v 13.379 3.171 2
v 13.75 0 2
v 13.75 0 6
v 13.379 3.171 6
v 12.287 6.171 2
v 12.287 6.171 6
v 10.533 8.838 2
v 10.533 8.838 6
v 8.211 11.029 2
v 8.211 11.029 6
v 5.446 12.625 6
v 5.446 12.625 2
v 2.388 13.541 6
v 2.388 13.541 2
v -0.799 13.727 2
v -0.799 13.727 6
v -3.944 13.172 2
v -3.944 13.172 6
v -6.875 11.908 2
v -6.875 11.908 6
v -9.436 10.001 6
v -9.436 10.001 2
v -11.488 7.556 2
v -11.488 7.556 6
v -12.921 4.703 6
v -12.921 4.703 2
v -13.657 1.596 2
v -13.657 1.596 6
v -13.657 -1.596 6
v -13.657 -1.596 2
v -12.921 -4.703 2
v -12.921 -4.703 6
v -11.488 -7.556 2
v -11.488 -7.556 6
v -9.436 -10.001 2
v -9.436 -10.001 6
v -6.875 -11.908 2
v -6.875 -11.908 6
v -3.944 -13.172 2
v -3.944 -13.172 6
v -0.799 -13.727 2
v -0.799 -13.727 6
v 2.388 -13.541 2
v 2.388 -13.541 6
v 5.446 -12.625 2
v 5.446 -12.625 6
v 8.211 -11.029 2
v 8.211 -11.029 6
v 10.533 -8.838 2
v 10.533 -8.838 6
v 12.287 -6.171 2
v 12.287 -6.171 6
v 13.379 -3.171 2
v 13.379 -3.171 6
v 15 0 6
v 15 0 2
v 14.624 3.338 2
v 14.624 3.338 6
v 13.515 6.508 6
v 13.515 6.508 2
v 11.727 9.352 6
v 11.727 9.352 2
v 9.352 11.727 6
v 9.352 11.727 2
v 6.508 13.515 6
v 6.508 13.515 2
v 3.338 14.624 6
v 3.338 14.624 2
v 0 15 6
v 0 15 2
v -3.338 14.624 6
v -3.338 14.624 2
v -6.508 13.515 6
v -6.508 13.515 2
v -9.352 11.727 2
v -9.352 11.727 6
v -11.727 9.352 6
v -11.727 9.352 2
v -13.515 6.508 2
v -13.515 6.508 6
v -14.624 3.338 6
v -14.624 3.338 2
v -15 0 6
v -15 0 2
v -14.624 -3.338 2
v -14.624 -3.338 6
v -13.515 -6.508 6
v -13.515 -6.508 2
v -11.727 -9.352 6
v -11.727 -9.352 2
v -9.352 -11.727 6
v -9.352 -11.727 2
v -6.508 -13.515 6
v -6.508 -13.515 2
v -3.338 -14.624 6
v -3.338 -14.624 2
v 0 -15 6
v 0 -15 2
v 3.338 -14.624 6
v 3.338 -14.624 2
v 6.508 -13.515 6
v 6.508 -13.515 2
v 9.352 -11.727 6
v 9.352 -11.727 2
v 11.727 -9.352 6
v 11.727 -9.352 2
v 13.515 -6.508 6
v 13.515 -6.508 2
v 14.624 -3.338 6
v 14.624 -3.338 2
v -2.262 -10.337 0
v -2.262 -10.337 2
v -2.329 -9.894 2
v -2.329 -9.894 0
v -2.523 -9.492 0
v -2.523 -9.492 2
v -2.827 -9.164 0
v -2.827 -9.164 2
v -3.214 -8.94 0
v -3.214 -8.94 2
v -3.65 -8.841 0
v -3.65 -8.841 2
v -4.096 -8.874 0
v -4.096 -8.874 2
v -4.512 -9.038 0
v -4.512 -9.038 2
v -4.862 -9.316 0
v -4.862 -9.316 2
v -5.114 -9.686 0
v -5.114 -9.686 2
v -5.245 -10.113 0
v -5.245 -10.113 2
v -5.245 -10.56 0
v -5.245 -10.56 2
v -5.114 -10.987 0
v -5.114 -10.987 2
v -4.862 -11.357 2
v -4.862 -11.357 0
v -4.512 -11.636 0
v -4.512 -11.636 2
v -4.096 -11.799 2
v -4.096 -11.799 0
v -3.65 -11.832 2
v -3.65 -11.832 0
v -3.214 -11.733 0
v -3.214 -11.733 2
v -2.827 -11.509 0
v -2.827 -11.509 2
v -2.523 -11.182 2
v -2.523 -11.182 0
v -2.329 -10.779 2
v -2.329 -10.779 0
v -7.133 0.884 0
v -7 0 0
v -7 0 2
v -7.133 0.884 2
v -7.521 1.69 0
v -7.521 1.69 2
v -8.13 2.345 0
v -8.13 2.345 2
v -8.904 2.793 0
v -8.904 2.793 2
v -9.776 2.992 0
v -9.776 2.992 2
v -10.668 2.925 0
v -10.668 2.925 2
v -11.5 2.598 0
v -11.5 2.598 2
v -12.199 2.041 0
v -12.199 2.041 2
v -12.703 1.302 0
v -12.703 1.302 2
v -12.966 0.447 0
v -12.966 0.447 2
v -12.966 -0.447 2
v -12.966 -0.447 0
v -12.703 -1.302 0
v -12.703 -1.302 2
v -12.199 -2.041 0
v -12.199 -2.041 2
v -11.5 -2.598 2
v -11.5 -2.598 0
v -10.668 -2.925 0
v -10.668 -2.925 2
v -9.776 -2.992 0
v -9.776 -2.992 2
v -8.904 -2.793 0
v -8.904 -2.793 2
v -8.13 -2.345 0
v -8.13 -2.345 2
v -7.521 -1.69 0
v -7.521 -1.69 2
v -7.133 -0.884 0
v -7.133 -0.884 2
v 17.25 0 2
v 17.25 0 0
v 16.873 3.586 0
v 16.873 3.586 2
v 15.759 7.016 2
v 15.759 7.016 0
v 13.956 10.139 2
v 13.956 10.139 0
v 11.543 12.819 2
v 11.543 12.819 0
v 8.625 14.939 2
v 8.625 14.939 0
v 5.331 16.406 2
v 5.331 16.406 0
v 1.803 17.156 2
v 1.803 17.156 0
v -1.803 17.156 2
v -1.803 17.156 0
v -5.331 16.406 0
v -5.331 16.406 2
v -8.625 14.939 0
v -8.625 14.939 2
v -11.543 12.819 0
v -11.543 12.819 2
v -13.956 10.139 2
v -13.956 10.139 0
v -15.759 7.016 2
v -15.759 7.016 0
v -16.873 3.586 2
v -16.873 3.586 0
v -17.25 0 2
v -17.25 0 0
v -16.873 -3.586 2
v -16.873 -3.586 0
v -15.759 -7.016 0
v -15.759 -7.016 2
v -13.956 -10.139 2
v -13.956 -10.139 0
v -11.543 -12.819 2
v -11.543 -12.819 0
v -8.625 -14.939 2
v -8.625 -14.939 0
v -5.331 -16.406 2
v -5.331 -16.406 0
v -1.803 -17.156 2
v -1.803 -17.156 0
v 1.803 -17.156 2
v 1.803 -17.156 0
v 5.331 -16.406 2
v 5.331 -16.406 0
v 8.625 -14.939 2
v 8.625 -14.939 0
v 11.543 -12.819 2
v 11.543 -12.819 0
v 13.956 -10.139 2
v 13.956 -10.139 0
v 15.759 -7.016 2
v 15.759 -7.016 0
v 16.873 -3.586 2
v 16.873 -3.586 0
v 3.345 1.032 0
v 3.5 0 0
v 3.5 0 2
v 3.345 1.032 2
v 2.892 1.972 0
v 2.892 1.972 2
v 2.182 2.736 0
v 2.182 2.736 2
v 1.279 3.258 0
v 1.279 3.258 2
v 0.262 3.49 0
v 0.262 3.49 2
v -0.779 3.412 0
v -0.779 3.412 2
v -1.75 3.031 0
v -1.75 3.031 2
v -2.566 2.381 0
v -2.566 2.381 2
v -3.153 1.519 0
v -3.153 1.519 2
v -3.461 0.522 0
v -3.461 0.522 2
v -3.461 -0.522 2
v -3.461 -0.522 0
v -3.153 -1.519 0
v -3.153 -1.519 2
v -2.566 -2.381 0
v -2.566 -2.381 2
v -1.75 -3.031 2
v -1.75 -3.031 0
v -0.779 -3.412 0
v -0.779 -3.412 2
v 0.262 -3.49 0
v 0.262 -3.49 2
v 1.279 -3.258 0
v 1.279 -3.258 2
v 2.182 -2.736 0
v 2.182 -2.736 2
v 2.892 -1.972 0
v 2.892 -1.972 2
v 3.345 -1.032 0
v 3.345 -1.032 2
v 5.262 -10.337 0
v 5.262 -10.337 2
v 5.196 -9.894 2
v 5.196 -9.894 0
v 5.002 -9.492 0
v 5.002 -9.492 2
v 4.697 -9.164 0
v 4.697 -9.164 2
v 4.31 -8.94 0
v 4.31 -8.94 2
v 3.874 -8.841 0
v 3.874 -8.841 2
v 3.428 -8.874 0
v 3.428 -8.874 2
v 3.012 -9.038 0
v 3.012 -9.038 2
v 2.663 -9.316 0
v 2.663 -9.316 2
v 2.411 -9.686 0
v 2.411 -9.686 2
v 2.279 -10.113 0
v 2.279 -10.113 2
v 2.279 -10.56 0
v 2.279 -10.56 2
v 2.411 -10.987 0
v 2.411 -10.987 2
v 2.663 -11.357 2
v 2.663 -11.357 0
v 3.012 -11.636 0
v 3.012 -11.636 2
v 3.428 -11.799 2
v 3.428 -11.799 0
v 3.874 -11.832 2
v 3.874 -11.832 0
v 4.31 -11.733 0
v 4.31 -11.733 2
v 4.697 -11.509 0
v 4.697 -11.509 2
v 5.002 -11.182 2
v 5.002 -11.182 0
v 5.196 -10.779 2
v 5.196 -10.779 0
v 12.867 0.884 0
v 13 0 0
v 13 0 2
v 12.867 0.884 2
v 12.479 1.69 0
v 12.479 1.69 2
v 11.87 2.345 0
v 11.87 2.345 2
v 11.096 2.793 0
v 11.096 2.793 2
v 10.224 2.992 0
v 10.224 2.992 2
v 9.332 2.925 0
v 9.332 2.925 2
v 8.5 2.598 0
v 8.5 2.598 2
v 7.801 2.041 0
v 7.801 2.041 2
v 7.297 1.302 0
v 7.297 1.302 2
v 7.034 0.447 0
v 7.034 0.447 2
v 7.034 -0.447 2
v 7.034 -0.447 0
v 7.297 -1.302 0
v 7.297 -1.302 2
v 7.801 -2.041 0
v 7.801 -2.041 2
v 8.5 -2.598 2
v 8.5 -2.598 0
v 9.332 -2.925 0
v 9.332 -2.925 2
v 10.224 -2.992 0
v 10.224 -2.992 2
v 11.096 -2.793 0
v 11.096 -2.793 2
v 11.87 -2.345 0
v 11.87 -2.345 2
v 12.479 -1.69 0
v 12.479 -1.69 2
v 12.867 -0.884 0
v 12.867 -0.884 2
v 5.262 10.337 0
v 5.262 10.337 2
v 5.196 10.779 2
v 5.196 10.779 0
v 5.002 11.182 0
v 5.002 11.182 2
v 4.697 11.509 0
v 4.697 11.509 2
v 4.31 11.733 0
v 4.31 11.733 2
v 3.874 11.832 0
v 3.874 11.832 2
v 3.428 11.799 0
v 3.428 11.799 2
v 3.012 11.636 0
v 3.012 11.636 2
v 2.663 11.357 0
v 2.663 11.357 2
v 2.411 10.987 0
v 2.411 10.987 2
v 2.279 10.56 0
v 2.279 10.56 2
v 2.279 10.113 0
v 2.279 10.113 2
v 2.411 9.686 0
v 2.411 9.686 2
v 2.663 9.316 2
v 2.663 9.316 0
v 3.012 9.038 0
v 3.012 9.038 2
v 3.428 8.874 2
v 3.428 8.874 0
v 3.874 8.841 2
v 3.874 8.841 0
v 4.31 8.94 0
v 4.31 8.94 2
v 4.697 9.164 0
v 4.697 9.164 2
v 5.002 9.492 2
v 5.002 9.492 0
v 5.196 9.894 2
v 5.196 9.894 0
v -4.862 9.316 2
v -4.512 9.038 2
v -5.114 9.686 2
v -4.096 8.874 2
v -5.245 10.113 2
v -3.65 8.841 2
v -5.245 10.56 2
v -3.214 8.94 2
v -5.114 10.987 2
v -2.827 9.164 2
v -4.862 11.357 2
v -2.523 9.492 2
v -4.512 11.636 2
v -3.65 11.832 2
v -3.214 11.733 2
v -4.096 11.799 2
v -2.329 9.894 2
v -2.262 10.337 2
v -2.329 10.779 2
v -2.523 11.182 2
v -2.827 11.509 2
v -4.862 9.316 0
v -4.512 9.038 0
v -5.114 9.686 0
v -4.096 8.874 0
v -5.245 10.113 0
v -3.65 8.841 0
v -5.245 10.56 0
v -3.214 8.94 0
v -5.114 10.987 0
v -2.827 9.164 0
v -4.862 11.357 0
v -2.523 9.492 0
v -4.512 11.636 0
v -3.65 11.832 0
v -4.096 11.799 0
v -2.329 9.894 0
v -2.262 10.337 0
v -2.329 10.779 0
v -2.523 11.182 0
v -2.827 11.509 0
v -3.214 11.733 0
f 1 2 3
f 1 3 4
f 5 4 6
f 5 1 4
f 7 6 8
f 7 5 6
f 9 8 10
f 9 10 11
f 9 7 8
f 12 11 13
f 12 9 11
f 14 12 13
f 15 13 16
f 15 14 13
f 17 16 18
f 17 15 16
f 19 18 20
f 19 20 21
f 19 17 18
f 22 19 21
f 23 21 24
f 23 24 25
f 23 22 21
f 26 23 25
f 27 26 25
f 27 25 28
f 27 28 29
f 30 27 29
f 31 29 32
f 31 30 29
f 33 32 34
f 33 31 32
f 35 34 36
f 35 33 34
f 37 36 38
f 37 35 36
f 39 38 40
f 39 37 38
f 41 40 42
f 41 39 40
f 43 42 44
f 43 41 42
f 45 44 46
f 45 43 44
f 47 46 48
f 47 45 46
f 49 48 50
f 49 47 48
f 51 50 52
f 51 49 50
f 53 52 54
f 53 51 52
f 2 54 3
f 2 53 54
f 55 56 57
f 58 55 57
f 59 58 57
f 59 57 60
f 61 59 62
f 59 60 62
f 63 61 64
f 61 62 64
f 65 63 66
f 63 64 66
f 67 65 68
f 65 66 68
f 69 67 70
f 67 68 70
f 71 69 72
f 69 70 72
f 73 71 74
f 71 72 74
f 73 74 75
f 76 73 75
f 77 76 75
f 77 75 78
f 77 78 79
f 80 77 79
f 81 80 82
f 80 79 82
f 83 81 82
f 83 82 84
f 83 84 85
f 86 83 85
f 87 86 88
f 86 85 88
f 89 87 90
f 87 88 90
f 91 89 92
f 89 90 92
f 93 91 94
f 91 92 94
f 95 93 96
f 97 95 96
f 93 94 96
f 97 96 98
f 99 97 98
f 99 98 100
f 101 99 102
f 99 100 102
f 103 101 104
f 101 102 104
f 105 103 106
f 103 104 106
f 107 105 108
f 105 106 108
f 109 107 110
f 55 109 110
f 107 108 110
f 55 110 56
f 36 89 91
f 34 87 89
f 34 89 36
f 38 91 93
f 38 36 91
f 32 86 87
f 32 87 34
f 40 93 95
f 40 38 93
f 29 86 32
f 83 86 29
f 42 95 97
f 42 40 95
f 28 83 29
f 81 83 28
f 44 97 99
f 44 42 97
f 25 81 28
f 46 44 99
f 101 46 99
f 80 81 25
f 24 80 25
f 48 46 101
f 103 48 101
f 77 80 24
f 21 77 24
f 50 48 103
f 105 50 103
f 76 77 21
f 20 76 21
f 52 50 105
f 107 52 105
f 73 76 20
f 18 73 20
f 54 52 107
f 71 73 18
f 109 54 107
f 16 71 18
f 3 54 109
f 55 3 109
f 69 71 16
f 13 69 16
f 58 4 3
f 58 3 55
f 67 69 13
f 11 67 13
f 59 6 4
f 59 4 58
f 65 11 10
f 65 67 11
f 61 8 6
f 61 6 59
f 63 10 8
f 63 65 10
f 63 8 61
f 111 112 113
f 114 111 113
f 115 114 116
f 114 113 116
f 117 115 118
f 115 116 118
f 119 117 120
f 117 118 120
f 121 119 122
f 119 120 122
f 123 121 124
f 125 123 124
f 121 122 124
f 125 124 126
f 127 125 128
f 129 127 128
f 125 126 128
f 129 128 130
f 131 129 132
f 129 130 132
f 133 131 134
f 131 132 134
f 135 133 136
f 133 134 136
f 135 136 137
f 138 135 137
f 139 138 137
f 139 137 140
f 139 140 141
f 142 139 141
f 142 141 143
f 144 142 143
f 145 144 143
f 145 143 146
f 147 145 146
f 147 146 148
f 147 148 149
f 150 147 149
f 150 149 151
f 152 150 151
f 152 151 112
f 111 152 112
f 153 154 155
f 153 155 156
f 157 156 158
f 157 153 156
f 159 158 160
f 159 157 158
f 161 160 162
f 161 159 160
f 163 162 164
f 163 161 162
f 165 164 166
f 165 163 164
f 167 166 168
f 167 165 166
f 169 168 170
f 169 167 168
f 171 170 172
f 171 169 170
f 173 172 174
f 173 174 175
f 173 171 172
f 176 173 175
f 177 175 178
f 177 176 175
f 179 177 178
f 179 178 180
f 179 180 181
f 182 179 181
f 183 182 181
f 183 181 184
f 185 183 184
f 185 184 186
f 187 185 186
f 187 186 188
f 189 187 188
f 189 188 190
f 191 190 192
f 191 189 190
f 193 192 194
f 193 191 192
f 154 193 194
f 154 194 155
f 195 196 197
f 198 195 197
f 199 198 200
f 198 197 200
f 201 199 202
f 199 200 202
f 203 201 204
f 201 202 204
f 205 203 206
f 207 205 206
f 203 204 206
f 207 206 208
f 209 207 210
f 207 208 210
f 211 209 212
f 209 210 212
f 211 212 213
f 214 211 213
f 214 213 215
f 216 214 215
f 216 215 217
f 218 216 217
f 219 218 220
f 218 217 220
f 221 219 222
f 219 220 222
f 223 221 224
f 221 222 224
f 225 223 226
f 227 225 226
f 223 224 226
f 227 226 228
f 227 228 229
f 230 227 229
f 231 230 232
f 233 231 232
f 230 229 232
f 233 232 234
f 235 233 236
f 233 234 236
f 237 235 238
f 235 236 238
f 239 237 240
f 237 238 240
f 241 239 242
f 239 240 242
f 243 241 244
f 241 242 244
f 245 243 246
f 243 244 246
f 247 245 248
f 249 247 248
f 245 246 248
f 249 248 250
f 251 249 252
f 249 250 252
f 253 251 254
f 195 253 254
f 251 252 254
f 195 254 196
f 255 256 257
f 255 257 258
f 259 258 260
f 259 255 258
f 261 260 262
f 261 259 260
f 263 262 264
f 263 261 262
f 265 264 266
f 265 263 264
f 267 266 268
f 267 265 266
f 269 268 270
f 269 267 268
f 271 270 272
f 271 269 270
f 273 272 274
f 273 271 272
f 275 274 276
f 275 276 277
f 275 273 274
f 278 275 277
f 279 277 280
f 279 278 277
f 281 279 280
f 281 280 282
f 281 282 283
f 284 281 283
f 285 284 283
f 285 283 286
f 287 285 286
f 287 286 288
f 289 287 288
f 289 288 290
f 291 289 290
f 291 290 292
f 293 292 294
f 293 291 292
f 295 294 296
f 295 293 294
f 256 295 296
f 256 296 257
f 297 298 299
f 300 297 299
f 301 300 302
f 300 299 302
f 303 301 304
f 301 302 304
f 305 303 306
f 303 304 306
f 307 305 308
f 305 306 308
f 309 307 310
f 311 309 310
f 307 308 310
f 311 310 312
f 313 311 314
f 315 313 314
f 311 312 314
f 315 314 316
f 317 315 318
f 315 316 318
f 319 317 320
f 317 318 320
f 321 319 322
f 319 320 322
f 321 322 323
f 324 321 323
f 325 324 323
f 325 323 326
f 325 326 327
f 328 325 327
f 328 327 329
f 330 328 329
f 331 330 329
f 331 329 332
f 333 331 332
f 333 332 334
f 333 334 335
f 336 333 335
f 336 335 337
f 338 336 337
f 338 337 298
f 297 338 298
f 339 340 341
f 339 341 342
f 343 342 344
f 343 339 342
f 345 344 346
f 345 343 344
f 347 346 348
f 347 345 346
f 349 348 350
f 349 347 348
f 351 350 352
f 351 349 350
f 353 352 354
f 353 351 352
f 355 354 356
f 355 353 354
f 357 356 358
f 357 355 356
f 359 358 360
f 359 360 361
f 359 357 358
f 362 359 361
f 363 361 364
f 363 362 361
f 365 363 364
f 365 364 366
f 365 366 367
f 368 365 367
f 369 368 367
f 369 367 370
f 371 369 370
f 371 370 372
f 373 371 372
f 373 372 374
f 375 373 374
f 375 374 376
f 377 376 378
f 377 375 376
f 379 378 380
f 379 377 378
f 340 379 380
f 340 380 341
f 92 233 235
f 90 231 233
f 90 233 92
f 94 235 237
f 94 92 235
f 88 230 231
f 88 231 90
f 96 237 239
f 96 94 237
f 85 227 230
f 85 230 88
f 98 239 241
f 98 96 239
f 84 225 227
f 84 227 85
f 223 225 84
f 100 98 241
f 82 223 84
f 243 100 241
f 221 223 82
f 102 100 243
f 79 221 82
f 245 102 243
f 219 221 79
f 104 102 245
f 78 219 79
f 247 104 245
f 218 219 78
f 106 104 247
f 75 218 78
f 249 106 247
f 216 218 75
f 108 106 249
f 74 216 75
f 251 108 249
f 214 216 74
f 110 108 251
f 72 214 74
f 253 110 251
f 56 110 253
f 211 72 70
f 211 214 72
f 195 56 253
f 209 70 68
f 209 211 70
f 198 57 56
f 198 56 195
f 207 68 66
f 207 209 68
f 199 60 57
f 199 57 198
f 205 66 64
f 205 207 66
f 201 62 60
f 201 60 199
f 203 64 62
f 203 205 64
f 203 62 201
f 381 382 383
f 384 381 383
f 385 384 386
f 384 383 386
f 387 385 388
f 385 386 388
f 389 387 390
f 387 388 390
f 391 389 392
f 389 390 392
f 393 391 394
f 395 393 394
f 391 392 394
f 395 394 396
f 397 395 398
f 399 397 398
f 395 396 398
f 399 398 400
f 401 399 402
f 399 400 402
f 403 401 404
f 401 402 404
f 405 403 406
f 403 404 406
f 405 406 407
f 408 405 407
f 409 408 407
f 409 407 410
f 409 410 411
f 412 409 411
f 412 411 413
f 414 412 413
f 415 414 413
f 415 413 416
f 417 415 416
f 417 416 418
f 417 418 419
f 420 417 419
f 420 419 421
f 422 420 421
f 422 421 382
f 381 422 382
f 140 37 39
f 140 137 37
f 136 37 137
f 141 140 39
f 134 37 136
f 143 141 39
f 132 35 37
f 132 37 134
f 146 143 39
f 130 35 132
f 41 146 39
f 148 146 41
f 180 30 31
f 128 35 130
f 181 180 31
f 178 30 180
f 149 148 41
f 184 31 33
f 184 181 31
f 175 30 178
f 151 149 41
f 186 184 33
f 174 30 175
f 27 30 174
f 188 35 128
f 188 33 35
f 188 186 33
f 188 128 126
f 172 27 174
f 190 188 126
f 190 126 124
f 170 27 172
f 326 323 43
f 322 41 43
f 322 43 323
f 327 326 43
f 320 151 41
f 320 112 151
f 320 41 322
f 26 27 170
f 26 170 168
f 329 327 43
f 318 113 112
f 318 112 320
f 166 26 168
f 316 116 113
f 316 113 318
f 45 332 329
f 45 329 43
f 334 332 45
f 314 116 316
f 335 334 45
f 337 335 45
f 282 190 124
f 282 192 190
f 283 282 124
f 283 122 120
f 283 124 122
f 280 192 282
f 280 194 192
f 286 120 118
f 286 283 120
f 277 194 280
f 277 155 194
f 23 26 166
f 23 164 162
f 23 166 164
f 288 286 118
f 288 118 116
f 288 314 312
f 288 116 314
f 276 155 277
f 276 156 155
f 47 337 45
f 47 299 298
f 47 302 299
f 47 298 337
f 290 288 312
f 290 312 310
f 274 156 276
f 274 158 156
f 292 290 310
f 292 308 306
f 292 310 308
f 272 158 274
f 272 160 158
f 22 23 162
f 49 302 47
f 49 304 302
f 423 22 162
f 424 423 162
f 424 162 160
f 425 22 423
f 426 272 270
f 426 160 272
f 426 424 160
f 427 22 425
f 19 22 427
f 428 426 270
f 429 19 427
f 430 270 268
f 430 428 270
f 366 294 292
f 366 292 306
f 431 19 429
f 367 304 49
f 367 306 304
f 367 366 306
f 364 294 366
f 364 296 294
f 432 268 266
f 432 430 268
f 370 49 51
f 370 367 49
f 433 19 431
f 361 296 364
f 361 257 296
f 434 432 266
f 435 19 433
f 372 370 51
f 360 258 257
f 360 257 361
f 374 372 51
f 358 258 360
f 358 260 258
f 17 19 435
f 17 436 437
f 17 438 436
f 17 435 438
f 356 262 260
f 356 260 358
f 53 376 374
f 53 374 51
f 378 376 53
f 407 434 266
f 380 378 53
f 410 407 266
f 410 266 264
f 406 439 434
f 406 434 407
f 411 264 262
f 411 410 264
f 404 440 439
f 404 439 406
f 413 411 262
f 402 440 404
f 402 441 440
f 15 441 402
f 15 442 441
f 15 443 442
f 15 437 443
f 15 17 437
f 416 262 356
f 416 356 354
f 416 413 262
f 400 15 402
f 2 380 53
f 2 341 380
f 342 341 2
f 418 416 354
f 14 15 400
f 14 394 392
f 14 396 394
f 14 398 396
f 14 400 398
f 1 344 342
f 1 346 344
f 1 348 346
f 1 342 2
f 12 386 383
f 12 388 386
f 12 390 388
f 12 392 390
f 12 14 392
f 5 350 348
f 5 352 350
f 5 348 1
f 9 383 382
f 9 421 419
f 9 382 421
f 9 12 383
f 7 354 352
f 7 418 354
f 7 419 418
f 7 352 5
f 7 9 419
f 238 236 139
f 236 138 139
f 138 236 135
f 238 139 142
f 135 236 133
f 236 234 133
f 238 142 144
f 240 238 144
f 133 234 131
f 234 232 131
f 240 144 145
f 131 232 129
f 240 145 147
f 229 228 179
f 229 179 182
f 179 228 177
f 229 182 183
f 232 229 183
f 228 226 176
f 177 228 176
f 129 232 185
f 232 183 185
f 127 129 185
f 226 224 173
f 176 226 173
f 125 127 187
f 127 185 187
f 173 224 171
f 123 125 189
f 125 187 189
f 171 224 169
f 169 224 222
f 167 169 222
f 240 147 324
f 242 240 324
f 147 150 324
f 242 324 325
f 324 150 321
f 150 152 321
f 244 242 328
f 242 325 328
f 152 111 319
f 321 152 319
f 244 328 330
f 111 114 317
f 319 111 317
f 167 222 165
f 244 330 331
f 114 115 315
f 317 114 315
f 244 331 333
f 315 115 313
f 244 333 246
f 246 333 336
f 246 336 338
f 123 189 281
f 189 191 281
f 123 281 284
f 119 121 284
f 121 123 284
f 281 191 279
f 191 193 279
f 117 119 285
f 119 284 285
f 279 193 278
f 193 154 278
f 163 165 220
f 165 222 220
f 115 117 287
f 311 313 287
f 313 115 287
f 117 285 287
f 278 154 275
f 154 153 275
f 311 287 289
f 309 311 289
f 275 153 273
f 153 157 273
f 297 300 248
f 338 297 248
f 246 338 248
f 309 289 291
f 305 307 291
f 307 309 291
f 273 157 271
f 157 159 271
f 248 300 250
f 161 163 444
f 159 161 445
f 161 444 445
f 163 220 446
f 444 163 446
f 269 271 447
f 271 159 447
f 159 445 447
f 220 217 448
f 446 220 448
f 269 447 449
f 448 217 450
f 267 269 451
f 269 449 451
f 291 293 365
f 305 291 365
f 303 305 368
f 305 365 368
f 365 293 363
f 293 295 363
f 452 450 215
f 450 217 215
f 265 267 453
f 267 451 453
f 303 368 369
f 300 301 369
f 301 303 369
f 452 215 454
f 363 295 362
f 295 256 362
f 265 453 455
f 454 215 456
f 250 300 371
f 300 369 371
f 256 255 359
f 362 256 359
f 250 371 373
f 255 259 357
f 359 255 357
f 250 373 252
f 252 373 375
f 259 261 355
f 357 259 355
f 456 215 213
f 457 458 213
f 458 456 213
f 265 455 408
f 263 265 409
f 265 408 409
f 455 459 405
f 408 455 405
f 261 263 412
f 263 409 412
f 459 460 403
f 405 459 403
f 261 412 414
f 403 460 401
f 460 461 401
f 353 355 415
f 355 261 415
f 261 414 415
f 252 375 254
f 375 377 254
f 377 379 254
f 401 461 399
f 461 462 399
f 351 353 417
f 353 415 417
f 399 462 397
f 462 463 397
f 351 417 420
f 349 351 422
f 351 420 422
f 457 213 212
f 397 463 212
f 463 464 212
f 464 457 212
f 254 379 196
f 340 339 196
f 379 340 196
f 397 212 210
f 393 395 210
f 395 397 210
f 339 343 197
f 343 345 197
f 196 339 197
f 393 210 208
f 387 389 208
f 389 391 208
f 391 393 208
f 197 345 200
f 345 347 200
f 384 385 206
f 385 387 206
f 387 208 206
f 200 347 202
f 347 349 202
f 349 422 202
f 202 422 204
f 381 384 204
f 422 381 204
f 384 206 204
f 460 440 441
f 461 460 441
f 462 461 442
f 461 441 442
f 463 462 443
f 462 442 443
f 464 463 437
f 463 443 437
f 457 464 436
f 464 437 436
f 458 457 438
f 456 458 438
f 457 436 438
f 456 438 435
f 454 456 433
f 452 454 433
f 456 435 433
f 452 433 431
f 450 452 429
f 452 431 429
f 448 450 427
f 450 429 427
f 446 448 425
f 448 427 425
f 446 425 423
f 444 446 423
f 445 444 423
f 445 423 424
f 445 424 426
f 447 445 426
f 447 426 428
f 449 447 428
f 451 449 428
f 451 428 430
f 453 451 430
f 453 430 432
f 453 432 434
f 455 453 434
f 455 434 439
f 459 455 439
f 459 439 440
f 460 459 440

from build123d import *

# Parameters (mm, degrees)
SKETCH_R      = 17.25
SKETCH_R_2    = 3.5
SKETCH_R_3    = 3
PAD_DEPTH     = 2
SKETCH003_R   = 15
SKETCH003_R_2 = 13.75
PAD001_DEPTH  = 4
SKETCH005_R   = 1.5
POCKET_DEPTH  = 2.001


with BuildPart() as part:
    # Sketch → Pad (new body)
    with BuildSketch(Plane.XY):
        Circle(SKETCH_R)
        Circle(SKETCH_R_2, mode=Mode.SUBTRACT)
        with Locations((10, 0)):
            Circle(SKETCH_R_3, mode=Mode.SUBTRACT)
        with Locations((-10, 0)):
            Circle(SKETCH_R_3, mode=Mode.SUBTRACT)
    extrude(amount=PAD_DEPTH)

    # Sketch003 (on Face6 of Pad) → Pad001 (join)
    with BuildSketch(Plane.XY.offset(2)):
        Circle(SKETCH003_R)
        Circle(SKETCH003_R_2, mode=Mode.SUBTRACT)
    extrude(amount=PAD001_DEPTH)

    # Sketch005 (on Face6 of Pad) → Pocket (cut, through all)
    with BuildSketch(Plane.XY.offset(2)):
        with Locations((-3.762222, 10.336619)):
            Circle(SKETCH005_R)
        with Locations((3.762222, 10.336619)):
            Circle(SKETCH005_R)
        with Locations((-3.762222, -10.336619)):
            Circle(SKETCH005_R)
        with Locations((3.762222, -10.336619)):
            Circle(SKETCH005_R)
    extrude(amount=-POCKET_DEPTH, mode=Mode.SUBTRACT)


solid = part.part
